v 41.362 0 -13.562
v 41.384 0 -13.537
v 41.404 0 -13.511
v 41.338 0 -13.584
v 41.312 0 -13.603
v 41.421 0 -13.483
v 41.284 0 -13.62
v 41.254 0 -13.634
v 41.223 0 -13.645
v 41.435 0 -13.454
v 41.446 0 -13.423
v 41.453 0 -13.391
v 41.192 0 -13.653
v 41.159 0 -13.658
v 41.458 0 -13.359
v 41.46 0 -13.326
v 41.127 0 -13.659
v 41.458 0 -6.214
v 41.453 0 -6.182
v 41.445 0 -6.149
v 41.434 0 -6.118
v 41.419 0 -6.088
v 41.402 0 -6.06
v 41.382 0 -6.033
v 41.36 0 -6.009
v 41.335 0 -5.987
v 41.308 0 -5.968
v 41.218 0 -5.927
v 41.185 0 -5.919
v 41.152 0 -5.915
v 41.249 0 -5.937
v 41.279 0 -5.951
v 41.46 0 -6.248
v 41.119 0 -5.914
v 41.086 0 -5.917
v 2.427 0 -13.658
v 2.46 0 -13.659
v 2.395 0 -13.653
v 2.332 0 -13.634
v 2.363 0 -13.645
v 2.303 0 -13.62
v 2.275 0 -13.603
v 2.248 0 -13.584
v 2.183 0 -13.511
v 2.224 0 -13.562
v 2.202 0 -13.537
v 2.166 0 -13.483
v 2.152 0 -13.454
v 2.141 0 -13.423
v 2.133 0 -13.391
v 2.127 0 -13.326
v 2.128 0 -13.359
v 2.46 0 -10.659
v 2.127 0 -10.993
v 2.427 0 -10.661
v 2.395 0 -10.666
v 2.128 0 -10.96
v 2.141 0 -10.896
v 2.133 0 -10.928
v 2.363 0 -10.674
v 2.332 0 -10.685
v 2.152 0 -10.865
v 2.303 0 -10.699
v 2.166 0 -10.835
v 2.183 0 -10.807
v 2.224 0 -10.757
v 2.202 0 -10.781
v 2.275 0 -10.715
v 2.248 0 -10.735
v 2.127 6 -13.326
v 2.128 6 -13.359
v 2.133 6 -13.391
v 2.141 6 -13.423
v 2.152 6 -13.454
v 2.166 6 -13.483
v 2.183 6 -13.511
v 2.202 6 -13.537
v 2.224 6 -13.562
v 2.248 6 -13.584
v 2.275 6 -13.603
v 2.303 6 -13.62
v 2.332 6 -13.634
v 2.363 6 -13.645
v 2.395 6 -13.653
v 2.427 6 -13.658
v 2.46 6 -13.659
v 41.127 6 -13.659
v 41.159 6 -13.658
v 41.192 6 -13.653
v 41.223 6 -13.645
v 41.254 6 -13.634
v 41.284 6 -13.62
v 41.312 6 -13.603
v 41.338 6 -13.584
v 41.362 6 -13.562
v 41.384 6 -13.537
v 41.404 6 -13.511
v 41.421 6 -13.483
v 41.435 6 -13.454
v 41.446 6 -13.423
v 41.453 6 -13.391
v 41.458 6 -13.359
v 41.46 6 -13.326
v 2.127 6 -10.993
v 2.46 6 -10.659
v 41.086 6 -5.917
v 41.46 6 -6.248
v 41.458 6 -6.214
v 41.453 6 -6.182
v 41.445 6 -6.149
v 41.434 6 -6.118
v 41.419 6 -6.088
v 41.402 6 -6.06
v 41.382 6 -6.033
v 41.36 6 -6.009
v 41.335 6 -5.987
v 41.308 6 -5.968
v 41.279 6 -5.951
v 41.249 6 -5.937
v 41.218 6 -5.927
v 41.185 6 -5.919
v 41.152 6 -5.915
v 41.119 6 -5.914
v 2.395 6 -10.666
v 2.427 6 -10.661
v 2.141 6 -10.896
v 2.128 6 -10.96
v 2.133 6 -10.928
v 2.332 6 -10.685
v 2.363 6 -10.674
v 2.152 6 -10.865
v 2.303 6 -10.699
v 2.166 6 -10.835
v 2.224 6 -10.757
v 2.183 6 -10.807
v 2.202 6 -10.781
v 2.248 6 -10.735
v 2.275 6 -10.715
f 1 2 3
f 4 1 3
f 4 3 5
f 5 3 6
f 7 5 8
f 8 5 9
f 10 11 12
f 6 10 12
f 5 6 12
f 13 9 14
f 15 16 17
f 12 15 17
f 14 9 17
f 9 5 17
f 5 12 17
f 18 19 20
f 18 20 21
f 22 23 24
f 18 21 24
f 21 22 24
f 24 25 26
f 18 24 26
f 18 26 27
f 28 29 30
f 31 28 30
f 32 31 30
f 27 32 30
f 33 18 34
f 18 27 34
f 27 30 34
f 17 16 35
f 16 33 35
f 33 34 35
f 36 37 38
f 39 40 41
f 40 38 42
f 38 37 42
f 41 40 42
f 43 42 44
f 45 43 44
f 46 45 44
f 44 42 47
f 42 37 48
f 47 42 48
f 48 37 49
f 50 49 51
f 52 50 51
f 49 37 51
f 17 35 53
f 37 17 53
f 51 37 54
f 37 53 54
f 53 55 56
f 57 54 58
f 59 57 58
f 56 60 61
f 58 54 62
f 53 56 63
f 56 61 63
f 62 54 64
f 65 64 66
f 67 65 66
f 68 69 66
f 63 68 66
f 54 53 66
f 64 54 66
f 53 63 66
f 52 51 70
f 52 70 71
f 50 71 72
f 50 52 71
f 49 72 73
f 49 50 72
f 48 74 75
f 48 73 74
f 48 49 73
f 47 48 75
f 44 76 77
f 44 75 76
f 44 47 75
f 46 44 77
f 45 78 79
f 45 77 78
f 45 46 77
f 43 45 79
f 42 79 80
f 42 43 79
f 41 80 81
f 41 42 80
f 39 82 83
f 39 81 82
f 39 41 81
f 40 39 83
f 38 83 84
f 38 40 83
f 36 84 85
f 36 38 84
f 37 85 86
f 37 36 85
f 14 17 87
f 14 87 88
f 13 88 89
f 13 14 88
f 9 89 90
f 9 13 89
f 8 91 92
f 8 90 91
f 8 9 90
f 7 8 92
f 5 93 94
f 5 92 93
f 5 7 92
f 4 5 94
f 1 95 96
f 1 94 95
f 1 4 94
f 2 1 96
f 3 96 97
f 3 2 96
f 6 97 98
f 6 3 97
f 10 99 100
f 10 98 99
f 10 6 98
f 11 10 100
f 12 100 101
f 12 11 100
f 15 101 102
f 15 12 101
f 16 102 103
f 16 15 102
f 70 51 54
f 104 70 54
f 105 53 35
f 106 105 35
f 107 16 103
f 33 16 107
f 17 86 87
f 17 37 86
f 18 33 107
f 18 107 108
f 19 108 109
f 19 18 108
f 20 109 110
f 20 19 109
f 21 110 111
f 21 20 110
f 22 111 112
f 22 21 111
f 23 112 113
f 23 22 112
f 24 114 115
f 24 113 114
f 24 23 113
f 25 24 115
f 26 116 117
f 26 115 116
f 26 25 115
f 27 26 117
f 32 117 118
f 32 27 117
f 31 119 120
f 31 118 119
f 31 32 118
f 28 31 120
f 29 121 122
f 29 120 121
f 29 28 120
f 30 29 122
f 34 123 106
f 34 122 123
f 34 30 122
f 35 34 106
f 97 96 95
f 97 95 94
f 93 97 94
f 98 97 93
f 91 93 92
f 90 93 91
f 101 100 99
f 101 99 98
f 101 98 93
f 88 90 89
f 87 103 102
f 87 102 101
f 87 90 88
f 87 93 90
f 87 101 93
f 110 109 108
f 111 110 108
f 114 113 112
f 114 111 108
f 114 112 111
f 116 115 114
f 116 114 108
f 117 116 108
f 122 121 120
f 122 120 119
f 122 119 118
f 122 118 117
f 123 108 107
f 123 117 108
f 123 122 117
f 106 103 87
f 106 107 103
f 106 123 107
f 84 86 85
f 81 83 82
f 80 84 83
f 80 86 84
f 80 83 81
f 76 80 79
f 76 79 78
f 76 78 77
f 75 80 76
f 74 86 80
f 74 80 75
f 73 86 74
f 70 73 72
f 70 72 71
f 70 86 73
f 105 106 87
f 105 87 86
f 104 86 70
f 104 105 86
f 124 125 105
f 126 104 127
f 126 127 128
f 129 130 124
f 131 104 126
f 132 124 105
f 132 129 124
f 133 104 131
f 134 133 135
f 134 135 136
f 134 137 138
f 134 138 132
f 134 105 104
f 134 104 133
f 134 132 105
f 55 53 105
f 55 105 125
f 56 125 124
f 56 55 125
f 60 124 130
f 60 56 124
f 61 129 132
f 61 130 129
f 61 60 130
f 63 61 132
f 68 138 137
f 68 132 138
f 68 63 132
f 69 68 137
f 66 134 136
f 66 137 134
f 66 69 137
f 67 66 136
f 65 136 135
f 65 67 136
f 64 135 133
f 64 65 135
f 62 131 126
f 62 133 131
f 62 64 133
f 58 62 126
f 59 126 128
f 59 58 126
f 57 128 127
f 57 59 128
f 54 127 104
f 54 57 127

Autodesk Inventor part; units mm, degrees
ref_plane "YZ Plane" through (0, 0, 0) normal (1, 0, 0) x (0, 1, 0)
ref_plane "XZ Plane" through (0, 0, 0) normal (0, 1, 0) x (-1, 0, 0)
ref_plane "XY Plane" through (0, 0, 0) normal (0, 0, 1) x (1, 0, 0)
sketch "Sketch1" plane through (0, 0, 0) normal (0, 1, 0) x (-1, 0, 0)
  line L0 (-2.4599, -13.6593) -> (-41.1266, -13.6593)
  arc A0 (-41.4599, -13.326) -> (-41.1266, -13.6593) centre (-41.1266, -13.326) ccw
  arc A1 (-2.4599, -13.6593) -> (-2.1266, -13.326) centre (-2.4599, -13.326) ccw
  line L1 (-2.1266, -13.326) -> (-2.1266, -10.9926)
  arc A2 (-2.1266, -10.9926) -> (-2.4599, -10.6593) centre (-2.4599, -10.9926) ccw
  line L2 (-2.4599, -10.6593) -> (-41.086, -5.9166)
  arc A3 (-41.086, -5.9166) -> (-41.4599, -6.2475) centre (-41.1266, -6.2475) ccw
  line L3 (-41.4599, -13.326) -> (-41.4599, -6.2475)
  point P0 (0, 0)
  dimension "d0" = 38.6667
  dimension "d1" = 0.6667
  dimension "d2" = 0.6667
  dimension "d4" = 0.6667
  dimension "d5" = 2.6667
  dimension "d6" = 7
  dimension "d7" = 0.6667
  dimension "d11" = 39.3333
extrude "Extrusion1" add sketch "Sketch1" along normal blind 6
properties part number "Wedge"
